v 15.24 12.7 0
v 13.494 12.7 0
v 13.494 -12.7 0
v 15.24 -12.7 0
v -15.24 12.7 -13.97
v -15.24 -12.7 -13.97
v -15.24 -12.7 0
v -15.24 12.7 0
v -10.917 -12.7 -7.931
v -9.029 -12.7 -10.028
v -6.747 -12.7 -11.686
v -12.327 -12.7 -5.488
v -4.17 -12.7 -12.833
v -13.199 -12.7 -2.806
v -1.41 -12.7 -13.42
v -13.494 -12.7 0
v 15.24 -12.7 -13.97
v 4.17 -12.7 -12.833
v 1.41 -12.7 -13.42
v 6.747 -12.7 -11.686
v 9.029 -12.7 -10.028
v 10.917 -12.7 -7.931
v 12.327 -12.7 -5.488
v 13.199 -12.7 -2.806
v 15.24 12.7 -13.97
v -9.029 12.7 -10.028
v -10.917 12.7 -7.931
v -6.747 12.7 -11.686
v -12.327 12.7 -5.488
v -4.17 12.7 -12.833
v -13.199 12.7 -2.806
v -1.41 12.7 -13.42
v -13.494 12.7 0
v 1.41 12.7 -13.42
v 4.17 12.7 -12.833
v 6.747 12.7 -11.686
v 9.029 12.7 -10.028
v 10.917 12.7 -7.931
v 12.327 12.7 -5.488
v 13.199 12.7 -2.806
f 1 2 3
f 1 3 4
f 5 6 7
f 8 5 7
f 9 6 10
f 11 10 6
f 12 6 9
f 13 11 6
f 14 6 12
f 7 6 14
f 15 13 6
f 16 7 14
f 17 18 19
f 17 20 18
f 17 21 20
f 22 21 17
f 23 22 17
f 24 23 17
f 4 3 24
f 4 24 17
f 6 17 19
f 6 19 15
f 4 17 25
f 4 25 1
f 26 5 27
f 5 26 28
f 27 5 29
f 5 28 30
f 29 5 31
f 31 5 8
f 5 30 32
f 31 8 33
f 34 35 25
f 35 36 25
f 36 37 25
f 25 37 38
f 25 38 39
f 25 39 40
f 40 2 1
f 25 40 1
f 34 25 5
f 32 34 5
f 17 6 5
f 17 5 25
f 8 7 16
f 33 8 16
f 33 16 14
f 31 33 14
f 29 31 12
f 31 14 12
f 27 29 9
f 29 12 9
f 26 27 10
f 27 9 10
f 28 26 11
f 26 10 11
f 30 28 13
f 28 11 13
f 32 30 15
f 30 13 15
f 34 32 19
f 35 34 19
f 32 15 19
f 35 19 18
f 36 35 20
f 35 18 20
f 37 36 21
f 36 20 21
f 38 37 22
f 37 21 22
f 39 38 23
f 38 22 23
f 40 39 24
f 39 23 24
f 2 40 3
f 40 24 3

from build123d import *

# Parameters (mm, degrees)
F0_W     = 30.48
F0_H     = 27.94
F1_DEPTH = 12.7
F2_R     = 13.49375
F3_DEPTH = 25.4
F4_W     = 68.546237424
F4_H     = 31.4367190003
F5_DEPTH = 12.7


with BuildPart() as f1:
    # F0 (on Front) → F1 (new body, symmetric)
    with BuildSketch(Plane.XZ):
        Rectangle(F0_W, F0_H)
    extrude(amount=F1_DEPTH, both=True)

    # F2 (on face) → F3 (cut)
    with BuildSketch(Plane.XZ.offset(12.7)):
        Circle(F2_R)
    extrude(amount=-F3_DEPTH, mode=Mode.SUBTRACT)

    # F4 (on Front) → F5 (cut, symmetric)
    with BuildSketch(Plane.XZ):
        with Locations((3.9000464603, 15.7183595002)):
            Rectangle(F4_W, F4_H)
    extrude(amount=F5_DEPTH, both=True, mode=Mode.SUBTRACT)


solid = f1.part
